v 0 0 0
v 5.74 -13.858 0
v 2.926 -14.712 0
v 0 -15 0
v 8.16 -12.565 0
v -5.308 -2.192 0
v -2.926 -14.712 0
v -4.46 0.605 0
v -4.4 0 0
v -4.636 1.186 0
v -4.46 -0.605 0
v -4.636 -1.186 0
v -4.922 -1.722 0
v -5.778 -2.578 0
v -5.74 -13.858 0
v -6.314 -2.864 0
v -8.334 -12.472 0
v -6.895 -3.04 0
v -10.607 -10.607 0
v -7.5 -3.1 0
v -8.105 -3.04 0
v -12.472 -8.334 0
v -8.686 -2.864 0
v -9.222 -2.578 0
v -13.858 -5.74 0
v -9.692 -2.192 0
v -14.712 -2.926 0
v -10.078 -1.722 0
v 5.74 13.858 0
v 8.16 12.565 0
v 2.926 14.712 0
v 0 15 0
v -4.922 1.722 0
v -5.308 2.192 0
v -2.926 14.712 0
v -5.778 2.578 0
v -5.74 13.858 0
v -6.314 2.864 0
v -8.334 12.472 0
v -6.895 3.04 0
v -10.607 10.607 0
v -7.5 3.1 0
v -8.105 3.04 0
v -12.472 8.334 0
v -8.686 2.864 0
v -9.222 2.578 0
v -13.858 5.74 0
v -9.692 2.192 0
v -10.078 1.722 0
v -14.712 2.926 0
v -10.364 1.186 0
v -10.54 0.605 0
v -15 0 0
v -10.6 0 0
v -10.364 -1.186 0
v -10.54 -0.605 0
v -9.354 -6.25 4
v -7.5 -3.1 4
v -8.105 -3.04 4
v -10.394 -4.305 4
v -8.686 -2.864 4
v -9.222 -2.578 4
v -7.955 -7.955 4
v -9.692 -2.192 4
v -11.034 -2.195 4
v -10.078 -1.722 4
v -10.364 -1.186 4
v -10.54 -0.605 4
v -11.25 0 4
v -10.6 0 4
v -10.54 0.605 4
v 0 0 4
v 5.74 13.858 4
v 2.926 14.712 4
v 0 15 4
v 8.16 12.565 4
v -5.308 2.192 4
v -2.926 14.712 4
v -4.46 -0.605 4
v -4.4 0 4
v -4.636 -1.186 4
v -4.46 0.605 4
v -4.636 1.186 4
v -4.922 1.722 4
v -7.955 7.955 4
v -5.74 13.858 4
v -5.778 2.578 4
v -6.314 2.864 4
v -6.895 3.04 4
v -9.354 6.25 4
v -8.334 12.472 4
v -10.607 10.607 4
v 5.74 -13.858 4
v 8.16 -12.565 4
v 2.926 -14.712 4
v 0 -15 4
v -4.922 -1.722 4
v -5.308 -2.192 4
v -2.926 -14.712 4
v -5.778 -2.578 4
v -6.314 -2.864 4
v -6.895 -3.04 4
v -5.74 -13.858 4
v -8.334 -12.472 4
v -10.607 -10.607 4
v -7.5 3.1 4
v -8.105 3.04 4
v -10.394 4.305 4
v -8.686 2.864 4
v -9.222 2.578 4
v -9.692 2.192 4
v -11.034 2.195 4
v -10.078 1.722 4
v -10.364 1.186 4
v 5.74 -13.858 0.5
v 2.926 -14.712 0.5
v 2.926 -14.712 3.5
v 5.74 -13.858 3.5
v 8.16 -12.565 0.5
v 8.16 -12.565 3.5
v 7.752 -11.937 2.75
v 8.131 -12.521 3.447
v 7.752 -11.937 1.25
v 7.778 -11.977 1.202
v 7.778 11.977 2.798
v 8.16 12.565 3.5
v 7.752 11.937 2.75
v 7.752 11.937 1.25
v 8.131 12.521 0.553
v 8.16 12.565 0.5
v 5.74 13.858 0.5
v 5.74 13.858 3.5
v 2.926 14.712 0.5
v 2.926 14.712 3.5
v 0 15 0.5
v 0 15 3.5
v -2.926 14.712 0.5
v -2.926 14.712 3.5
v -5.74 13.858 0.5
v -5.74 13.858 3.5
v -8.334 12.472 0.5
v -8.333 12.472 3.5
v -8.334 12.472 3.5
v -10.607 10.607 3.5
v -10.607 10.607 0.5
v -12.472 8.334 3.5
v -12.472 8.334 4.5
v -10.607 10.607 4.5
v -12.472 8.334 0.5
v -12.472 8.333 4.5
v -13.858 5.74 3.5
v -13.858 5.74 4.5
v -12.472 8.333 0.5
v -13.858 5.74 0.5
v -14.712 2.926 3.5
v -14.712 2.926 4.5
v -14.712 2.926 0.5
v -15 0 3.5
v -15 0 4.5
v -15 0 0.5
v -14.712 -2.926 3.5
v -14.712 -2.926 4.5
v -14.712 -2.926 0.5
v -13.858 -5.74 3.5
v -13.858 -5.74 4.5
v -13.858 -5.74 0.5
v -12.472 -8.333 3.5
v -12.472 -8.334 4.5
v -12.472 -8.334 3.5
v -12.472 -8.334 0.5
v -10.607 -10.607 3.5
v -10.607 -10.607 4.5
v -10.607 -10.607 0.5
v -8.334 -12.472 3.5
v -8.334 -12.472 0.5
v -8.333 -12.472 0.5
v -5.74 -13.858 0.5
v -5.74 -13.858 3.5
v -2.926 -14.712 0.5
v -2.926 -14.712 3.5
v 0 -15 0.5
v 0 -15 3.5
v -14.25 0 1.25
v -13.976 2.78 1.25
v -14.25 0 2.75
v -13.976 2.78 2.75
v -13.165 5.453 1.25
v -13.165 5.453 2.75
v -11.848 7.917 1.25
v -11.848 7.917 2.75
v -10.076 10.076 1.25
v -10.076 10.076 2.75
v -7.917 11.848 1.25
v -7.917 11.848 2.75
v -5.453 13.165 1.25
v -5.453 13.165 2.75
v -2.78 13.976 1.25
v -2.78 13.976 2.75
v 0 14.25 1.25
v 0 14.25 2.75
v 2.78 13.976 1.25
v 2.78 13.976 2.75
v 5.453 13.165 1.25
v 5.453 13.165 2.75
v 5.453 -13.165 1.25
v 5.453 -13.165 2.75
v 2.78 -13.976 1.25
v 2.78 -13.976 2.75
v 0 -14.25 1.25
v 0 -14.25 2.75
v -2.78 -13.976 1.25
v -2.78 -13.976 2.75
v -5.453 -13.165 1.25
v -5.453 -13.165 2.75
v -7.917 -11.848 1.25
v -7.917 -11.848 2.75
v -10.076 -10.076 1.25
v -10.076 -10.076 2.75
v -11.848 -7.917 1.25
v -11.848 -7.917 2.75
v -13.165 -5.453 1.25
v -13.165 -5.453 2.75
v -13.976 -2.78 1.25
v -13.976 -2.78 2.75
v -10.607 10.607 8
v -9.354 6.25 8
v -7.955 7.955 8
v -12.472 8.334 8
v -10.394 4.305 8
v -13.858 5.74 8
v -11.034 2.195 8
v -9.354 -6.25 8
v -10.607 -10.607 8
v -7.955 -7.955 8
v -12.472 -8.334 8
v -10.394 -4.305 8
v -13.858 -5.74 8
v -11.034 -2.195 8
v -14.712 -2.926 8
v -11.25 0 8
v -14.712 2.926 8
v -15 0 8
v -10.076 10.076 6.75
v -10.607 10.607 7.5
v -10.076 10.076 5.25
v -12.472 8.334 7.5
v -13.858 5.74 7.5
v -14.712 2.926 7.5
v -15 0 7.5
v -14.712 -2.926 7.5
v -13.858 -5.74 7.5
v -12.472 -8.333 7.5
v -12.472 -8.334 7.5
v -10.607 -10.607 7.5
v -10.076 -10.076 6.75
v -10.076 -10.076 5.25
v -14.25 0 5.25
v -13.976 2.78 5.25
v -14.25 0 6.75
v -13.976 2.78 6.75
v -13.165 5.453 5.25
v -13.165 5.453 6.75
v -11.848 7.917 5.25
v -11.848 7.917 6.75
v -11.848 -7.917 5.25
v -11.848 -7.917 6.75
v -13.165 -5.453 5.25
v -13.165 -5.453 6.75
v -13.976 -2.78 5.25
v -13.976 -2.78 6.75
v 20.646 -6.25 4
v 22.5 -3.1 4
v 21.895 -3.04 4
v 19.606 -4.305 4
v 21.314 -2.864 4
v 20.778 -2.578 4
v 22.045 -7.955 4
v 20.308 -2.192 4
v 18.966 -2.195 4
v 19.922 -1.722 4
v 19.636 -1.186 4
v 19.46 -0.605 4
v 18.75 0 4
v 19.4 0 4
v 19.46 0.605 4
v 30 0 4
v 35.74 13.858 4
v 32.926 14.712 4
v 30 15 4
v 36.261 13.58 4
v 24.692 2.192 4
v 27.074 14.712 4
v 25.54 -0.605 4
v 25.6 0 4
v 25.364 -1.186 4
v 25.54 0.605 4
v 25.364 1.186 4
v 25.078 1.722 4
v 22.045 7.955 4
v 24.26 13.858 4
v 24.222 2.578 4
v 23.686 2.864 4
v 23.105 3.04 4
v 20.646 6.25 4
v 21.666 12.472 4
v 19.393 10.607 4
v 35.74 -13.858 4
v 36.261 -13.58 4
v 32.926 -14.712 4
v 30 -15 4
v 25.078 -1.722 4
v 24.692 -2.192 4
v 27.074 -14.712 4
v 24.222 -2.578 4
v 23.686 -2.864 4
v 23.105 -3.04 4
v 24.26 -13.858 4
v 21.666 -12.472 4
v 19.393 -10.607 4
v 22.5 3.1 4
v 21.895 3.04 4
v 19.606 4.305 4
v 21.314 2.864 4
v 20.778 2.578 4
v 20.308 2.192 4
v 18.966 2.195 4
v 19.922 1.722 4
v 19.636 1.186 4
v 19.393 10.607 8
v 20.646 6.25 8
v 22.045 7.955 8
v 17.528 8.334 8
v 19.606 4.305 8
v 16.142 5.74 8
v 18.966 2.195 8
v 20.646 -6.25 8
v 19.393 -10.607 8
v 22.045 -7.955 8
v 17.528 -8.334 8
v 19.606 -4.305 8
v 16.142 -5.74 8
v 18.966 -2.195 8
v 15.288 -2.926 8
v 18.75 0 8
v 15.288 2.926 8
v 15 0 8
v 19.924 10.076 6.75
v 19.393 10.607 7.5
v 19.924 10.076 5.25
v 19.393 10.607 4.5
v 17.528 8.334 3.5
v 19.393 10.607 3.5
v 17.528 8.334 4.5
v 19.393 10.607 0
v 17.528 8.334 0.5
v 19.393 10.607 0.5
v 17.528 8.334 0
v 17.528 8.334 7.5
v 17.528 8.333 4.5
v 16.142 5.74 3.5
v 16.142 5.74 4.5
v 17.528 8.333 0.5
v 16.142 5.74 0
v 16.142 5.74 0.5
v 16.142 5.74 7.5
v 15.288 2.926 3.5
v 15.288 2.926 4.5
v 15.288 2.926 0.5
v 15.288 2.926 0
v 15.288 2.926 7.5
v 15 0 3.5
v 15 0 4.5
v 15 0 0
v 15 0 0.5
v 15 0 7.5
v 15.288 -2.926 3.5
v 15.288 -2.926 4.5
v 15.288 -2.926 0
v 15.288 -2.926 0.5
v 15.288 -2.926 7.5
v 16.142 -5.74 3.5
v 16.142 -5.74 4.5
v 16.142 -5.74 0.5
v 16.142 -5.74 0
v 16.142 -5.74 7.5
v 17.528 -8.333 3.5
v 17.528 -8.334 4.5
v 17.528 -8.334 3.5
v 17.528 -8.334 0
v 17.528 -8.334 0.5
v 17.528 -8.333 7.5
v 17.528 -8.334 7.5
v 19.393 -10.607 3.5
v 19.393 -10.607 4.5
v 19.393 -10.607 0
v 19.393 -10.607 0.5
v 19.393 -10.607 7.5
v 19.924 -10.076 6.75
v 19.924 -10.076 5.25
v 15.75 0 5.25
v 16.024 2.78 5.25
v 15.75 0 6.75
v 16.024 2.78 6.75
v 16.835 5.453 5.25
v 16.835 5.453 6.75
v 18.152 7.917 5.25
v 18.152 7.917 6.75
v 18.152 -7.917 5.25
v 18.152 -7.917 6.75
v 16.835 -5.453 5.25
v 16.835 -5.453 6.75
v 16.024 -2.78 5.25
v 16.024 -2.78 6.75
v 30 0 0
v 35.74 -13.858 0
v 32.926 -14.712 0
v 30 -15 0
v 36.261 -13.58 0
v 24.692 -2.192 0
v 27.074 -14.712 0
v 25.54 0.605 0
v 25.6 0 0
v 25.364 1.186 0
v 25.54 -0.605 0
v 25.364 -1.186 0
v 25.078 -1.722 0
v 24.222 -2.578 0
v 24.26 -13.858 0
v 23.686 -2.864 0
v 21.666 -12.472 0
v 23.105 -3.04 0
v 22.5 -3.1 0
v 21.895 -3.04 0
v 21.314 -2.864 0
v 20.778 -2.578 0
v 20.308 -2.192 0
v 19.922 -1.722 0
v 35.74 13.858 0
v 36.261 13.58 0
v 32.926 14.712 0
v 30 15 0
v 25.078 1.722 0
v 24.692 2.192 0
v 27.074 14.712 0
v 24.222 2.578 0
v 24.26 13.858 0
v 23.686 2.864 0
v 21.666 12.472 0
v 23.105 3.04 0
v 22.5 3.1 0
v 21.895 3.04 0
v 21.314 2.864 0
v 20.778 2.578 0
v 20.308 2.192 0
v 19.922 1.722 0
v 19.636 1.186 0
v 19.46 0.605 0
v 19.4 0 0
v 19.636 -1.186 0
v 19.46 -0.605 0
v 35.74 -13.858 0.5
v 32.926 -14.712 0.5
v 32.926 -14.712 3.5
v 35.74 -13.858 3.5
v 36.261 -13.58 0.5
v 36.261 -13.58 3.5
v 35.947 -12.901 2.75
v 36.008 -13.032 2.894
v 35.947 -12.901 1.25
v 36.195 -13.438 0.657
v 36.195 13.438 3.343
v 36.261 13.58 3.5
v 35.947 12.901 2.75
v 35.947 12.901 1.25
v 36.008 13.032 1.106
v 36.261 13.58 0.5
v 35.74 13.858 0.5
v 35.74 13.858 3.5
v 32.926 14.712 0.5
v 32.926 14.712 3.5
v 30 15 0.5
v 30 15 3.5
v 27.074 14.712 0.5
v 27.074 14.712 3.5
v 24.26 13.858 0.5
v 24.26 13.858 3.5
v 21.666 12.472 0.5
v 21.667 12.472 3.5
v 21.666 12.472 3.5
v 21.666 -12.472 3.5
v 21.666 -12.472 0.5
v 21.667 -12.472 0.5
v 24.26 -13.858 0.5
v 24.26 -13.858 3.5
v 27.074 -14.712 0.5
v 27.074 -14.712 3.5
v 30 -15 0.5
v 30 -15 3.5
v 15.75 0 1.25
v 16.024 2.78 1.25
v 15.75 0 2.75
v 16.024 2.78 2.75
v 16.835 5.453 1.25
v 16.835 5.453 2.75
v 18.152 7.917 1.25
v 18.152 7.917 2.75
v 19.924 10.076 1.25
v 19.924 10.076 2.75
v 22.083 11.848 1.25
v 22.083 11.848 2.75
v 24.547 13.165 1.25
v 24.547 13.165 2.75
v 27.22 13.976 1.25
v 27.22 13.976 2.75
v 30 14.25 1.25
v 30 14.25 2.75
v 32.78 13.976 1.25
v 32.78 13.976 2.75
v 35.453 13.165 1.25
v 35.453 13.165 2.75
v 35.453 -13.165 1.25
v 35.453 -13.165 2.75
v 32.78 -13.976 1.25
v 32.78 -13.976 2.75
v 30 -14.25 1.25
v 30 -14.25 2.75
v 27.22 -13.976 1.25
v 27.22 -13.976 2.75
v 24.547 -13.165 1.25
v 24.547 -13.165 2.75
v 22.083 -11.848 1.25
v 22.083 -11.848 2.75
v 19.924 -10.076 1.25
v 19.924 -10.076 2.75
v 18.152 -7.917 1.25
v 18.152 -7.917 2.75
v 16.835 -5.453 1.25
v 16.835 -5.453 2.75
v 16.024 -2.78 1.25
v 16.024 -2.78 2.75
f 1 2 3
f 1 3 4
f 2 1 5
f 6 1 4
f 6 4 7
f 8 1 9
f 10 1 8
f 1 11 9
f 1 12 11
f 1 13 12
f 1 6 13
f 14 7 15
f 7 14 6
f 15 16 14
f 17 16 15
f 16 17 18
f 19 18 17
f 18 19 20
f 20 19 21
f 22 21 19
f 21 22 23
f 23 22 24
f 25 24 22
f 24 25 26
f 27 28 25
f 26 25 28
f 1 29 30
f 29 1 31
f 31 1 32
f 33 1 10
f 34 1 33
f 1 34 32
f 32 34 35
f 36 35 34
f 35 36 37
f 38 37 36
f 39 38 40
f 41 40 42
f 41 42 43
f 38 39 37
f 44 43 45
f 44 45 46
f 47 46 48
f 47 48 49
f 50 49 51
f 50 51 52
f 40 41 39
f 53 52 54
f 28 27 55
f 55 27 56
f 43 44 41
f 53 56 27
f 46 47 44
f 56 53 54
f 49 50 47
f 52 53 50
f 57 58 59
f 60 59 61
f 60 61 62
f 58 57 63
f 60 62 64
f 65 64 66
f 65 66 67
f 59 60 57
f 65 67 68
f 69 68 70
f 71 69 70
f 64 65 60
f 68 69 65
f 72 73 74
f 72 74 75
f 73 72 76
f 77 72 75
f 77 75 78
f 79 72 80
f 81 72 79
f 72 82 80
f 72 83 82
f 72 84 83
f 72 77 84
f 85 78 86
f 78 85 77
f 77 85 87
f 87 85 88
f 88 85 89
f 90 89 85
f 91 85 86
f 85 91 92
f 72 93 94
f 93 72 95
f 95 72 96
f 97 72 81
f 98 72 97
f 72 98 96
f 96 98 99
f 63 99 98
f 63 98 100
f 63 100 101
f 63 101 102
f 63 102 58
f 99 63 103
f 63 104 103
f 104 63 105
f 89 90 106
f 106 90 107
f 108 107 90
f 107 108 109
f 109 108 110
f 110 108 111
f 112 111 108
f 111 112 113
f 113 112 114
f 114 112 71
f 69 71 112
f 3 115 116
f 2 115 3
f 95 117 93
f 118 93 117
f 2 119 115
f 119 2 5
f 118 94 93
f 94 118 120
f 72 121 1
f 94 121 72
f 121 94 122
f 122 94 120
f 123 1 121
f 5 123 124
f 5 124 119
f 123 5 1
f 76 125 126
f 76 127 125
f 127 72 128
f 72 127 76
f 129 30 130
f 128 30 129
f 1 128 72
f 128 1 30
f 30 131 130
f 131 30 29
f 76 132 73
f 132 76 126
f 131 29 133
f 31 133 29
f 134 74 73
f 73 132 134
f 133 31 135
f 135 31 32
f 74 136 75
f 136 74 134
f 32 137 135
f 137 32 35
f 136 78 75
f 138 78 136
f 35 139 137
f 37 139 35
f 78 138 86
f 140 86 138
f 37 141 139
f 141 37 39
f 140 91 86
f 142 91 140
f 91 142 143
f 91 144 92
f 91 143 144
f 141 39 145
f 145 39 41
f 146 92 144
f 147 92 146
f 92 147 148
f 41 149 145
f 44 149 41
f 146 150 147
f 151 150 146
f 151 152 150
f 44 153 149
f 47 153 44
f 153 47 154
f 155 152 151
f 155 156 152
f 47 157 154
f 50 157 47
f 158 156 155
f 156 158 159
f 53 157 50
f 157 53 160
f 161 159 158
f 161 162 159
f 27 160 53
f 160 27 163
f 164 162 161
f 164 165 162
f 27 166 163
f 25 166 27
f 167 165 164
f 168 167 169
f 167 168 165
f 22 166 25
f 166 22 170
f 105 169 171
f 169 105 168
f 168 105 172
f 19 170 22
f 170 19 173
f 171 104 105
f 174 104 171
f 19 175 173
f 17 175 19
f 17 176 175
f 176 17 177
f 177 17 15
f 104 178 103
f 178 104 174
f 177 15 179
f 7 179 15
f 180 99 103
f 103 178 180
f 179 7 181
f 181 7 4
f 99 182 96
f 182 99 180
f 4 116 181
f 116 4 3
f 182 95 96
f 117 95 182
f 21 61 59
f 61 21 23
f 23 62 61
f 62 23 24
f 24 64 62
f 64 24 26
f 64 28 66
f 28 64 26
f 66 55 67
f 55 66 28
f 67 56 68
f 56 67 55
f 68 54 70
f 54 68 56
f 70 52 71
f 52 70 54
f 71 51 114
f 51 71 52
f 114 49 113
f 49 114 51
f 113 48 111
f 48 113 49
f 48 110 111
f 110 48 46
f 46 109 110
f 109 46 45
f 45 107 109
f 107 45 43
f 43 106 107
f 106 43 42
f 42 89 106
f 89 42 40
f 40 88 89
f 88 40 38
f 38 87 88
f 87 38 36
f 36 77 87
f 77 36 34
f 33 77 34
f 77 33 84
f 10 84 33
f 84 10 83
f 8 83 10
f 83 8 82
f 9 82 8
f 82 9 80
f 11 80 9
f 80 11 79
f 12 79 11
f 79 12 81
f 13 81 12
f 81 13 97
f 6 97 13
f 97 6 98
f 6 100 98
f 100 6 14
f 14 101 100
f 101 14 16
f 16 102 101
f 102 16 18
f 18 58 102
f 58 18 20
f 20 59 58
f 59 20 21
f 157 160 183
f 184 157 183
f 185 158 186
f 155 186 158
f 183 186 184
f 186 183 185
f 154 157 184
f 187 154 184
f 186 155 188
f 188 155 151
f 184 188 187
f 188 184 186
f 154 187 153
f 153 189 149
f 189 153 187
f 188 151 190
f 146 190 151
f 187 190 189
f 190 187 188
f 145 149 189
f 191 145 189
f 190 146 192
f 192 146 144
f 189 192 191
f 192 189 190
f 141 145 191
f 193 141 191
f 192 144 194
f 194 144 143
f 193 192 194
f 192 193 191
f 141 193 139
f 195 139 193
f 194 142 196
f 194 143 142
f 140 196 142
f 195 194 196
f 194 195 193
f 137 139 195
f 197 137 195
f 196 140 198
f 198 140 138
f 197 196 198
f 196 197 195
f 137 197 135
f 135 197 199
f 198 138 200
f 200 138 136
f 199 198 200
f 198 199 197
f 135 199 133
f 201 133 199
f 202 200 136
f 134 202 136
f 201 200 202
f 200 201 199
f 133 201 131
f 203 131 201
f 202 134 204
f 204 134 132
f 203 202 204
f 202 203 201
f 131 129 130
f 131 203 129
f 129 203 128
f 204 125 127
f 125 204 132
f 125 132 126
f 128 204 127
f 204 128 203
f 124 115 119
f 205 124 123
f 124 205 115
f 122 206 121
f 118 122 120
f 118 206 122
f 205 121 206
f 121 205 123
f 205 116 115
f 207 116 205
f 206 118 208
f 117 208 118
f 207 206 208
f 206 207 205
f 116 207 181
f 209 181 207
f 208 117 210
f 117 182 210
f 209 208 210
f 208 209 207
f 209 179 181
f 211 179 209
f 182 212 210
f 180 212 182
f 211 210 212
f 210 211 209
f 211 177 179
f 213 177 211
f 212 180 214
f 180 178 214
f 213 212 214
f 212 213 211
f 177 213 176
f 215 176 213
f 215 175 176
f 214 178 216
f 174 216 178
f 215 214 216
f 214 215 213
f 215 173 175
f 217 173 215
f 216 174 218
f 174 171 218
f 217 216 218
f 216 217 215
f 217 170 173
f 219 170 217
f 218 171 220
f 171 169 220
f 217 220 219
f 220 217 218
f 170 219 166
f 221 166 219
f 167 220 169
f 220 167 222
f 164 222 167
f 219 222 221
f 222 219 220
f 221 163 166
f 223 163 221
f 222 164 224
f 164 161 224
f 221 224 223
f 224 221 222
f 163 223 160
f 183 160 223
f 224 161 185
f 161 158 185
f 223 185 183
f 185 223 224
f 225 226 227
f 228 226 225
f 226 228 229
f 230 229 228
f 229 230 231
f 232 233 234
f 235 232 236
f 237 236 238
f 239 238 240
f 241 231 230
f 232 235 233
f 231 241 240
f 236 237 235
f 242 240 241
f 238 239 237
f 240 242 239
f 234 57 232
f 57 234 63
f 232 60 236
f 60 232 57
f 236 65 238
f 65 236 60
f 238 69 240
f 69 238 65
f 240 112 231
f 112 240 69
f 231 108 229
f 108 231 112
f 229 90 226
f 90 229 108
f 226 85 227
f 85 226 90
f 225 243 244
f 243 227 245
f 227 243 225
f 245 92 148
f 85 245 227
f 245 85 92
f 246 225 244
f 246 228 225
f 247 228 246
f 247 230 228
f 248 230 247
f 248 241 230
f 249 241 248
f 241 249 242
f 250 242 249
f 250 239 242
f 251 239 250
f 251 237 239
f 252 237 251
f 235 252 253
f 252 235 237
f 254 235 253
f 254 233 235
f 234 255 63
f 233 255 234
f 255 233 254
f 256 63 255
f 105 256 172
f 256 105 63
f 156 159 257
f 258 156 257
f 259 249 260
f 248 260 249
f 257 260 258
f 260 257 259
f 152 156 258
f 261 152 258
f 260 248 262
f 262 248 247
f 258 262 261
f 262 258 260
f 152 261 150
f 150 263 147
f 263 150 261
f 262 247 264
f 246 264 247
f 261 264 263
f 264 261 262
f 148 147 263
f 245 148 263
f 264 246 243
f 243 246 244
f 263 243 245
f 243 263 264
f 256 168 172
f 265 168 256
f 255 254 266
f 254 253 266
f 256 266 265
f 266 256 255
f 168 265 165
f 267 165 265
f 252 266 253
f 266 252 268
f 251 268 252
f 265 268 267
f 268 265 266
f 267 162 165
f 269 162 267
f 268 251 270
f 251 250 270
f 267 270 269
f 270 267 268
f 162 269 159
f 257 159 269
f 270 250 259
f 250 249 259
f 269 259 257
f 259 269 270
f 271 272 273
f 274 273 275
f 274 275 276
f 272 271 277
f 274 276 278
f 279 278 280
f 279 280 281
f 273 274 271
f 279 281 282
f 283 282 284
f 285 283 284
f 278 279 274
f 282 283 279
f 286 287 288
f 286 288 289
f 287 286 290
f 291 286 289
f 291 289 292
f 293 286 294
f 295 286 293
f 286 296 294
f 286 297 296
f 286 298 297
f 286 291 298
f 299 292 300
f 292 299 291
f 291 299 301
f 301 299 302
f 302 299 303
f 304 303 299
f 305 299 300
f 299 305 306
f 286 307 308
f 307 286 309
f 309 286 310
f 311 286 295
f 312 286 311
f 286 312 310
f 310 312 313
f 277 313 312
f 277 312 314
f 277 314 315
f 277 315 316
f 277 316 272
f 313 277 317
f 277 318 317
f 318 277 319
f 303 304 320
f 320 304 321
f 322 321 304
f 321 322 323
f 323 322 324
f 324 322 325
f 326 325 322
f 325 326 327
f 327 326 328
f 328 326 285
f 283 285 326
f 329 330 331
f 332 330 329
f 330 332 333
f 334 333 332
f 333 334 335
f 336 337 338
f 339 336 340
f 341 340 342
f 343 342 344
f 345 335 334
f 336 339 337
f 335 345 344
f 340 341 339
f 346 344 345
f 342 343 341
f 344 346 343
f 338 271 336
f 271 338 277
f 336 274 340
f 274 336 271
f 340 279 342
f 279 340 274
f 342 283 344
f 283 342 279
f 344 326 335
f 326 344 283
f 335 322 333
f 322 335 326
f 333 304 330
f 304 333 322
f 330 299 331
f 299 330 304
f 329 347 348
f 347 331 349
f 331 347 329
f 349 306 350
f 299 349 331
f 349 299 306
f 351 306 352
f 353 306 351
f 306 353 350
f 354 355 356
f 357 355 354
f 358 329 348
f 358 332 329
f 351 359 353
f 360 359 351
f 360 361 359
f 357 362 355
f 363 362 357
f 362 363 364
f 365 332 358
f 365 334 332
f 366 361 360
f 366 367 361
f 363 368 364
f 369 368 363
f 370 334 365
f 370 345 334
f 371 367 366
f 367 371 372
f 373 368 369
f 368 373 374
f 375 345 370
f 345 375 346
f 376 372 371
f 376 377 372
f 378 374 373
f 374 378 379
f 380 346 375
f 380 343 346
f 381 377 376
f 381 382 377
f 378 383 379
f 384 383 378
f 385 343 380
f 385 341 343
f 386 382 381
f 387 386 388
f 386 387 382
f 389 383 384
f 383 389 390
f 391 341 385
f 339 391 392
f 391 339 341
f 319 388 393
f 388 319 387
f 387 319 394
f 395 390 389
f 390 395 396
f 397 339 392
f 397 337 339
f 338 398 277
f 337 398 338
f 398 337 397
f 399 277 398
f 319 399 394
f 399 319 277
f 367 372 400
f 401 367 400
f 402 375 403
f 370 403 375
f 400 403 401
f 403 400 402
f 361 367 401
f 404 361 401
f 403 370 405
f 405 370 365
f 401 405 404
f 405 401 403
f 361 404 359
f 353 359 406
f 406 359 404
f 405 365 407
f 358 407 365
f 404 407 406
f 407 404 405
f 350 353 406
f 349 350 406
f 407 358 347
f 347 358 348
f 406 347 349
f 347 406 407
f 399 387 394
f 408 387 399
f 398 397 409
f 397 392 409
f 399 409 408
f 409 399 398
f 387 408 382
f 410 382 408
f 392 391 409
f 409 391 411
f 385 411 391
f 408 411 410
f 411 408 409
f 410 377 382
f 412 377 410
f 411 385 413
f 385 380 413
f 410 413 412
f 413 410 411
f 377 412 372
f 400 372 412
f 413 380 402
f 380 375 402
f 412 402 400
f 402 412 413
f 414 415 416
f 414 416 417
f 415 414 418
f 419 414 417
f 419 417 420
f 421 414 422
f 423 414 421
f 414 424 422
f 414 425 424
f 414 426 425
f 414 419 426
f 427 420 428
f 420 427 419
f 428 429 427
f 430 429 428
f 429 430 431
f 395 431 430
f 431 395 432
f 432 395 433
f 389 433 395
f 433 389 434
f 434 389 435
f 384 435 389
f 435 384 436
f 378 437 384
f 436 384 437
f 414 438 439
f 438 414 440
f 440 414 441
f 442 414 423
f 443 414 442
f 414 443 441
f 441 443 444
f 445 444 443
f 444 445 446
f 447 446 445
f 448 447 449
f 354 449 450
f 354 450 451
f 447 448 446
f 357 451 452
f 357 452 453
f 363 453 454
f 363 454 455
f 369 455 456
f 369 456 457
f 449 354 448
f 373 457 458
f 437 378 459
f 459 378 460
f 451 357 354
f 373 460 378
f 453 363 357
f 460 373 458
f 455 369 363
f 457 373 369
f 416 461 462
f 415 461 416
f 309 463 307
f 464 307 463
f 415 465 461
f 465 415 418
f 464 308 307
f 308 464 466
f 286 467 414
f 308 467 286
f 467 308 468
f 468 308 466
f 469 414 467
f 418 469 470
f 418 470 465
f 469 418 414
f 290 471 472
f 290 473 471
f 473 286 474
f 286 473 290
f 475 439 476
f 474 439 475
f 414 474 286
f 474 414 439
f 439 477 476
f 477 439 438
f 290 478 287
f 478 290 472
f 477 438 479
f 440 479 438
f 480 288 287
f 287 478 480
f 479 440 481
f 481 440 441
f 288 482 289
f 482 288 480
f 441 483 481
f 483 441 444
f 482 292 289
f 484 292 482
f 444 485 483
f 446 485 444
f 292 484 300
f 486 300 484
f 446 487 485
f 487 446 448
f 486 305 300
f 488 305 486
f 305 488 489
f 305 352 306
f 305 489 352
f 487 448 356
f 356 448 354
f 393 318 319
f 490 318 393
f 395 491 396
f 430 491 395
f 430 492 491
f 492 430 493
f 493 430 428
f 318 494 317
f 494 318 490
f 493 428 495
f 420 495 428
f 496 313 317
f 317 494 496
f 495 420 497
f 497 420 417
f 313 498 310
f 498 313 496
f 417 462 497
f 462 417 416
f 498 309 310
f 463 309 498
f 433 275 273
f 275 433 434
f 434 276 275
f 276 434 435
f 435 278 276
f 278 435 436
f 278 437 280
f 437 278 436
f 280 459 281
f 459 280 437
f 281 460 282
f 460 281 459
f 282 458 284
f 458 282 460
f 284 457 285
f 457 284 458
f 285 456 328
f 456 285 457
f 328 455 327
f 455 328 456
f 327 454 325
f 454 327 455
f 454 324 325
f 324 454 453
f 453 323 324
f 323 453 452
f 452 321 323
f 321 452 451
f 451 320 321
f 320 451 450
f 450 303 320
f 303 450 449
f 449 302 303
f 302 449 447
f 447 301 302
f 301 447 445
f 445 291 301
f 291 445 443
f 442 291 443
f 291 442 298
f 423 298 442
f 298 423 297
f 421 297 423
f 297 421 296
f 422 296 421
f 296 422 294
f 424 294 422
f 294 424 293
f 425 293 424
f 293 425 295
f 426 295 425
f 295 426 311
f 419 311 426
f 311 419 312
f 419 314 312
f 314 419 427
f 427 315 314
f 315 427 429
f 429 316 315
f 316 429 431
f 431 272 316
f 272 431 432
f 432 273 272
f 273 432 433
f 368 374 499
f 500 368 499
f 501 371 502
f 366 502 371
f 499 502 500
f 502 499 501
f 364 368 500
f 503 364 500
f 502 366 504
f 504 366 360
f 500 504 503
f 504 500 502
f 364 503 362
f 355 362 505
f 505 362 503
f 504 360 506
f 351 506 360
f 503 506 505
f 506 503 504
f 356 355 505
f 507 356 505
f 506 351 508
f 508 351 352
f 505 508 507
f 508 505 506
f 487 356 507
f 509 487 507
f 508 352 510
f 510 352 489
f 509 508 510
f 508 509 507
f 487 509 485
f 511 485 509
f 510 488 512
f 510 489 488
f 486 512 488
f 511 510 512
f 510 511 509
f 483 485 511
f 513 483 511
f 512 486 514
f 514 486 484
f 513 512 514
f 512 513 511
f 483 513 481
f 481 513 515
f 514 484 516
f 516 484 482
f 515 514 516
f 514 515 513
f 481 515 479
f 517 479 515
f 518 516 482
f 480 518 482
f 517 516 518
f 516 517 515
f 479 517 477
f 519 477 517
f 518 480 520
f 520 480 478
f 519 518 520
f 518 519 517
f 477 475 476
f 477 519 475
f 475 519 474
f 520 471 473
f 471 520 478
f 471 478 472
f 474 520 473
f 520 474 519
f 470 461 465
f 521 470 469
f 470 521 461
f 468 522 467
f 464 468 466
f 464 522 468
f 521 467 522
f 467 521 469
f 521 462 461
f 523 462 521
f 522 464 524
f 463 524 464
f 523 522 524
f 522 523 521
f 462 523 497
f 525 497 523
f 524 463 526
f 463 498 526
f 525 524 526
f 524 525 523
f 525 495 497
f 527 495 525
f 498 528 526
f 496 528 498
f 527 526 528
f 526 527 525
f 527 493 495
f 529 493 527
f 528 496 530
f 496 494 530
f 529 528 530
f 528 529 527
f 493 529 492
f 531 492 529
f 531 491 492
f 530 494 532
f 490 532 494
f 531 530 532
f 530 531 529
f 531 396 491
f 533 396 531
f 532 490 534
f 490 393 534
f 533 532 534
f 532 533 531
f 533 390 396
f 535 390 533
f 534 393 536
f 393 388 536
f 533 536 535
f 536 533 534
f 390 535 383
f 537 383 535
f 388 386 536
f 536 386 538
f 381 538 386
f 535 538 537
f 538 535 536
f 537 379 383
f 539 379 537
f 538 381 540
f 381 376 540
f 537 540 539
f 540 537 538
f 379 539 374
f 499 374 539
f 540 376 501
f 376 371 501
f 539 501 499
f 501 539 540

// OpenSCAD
// quadrilateral holder -- pair can be joined by rubber band etc

$fn = 32;

THETA_1 = 114;
THETA_2 = 130.5;
BASE_THICK = 4;
BASE_R = 15;
BAND_THICK = BASE_THICK * 0.75;
BAND_GROOVE = 0.75; // mm

module pacman(theta, outer_only=false)
difference() {
    linear_extrude(BASE_THICK)
    difference() {
        circle(r=BASE_R)
            ;
        polygon([
            [0, 0],
            [cos(theta/2), -sin(theta/2)] * BASE_R * 10,
            [BASE_R * 100, 0],
            [cos(theta/2), sin(theta/2)] * BASE_R * 10
        ])
            ;
        translate([-BASE_R * 0.5, 0])
        circle(d=6.2)
            ;
        if (outer_only)
        circle(r=BASE_R * 0.75)
            ;
    }
        ;
    translate([0, 0, (BASE_THICK - BAND_THICK) / 2])
    rotate_extrude()
    translate([BASE_R - BAND_GROOVE, 0])
    hull () {
        translate([0, BAND_GROOVE])
        square([BAND_GROOVE + 1, BAND_THICK - BAND_GROOVE * 2])
            ;
        translate([BAND_GROOVE, 0])
        square([BAND_GROOVE, BAND_THICK])
            ;
    }
}


module pacman_with_top(theta) {
    pacman(theta)
        ;
    translate([0, 0, BASE_THICK])
    pacman(270, outer_only=true)
        ;
}


PREVIEW = false;  // otherwise print

pacman_with_top(THETA_1)
    ;

if(PREVIEW)
color("red")
translate([BASE_R * 0.5, 0, 2 * BASE_THICK])
rotate([180, 0, 180])
pacman_with_top(THETA_2)
    ;

if(!PREVIEW)
translate([BASE_R * 2, 0, 0])
pacman_with_top(THETA_2)
    ;
